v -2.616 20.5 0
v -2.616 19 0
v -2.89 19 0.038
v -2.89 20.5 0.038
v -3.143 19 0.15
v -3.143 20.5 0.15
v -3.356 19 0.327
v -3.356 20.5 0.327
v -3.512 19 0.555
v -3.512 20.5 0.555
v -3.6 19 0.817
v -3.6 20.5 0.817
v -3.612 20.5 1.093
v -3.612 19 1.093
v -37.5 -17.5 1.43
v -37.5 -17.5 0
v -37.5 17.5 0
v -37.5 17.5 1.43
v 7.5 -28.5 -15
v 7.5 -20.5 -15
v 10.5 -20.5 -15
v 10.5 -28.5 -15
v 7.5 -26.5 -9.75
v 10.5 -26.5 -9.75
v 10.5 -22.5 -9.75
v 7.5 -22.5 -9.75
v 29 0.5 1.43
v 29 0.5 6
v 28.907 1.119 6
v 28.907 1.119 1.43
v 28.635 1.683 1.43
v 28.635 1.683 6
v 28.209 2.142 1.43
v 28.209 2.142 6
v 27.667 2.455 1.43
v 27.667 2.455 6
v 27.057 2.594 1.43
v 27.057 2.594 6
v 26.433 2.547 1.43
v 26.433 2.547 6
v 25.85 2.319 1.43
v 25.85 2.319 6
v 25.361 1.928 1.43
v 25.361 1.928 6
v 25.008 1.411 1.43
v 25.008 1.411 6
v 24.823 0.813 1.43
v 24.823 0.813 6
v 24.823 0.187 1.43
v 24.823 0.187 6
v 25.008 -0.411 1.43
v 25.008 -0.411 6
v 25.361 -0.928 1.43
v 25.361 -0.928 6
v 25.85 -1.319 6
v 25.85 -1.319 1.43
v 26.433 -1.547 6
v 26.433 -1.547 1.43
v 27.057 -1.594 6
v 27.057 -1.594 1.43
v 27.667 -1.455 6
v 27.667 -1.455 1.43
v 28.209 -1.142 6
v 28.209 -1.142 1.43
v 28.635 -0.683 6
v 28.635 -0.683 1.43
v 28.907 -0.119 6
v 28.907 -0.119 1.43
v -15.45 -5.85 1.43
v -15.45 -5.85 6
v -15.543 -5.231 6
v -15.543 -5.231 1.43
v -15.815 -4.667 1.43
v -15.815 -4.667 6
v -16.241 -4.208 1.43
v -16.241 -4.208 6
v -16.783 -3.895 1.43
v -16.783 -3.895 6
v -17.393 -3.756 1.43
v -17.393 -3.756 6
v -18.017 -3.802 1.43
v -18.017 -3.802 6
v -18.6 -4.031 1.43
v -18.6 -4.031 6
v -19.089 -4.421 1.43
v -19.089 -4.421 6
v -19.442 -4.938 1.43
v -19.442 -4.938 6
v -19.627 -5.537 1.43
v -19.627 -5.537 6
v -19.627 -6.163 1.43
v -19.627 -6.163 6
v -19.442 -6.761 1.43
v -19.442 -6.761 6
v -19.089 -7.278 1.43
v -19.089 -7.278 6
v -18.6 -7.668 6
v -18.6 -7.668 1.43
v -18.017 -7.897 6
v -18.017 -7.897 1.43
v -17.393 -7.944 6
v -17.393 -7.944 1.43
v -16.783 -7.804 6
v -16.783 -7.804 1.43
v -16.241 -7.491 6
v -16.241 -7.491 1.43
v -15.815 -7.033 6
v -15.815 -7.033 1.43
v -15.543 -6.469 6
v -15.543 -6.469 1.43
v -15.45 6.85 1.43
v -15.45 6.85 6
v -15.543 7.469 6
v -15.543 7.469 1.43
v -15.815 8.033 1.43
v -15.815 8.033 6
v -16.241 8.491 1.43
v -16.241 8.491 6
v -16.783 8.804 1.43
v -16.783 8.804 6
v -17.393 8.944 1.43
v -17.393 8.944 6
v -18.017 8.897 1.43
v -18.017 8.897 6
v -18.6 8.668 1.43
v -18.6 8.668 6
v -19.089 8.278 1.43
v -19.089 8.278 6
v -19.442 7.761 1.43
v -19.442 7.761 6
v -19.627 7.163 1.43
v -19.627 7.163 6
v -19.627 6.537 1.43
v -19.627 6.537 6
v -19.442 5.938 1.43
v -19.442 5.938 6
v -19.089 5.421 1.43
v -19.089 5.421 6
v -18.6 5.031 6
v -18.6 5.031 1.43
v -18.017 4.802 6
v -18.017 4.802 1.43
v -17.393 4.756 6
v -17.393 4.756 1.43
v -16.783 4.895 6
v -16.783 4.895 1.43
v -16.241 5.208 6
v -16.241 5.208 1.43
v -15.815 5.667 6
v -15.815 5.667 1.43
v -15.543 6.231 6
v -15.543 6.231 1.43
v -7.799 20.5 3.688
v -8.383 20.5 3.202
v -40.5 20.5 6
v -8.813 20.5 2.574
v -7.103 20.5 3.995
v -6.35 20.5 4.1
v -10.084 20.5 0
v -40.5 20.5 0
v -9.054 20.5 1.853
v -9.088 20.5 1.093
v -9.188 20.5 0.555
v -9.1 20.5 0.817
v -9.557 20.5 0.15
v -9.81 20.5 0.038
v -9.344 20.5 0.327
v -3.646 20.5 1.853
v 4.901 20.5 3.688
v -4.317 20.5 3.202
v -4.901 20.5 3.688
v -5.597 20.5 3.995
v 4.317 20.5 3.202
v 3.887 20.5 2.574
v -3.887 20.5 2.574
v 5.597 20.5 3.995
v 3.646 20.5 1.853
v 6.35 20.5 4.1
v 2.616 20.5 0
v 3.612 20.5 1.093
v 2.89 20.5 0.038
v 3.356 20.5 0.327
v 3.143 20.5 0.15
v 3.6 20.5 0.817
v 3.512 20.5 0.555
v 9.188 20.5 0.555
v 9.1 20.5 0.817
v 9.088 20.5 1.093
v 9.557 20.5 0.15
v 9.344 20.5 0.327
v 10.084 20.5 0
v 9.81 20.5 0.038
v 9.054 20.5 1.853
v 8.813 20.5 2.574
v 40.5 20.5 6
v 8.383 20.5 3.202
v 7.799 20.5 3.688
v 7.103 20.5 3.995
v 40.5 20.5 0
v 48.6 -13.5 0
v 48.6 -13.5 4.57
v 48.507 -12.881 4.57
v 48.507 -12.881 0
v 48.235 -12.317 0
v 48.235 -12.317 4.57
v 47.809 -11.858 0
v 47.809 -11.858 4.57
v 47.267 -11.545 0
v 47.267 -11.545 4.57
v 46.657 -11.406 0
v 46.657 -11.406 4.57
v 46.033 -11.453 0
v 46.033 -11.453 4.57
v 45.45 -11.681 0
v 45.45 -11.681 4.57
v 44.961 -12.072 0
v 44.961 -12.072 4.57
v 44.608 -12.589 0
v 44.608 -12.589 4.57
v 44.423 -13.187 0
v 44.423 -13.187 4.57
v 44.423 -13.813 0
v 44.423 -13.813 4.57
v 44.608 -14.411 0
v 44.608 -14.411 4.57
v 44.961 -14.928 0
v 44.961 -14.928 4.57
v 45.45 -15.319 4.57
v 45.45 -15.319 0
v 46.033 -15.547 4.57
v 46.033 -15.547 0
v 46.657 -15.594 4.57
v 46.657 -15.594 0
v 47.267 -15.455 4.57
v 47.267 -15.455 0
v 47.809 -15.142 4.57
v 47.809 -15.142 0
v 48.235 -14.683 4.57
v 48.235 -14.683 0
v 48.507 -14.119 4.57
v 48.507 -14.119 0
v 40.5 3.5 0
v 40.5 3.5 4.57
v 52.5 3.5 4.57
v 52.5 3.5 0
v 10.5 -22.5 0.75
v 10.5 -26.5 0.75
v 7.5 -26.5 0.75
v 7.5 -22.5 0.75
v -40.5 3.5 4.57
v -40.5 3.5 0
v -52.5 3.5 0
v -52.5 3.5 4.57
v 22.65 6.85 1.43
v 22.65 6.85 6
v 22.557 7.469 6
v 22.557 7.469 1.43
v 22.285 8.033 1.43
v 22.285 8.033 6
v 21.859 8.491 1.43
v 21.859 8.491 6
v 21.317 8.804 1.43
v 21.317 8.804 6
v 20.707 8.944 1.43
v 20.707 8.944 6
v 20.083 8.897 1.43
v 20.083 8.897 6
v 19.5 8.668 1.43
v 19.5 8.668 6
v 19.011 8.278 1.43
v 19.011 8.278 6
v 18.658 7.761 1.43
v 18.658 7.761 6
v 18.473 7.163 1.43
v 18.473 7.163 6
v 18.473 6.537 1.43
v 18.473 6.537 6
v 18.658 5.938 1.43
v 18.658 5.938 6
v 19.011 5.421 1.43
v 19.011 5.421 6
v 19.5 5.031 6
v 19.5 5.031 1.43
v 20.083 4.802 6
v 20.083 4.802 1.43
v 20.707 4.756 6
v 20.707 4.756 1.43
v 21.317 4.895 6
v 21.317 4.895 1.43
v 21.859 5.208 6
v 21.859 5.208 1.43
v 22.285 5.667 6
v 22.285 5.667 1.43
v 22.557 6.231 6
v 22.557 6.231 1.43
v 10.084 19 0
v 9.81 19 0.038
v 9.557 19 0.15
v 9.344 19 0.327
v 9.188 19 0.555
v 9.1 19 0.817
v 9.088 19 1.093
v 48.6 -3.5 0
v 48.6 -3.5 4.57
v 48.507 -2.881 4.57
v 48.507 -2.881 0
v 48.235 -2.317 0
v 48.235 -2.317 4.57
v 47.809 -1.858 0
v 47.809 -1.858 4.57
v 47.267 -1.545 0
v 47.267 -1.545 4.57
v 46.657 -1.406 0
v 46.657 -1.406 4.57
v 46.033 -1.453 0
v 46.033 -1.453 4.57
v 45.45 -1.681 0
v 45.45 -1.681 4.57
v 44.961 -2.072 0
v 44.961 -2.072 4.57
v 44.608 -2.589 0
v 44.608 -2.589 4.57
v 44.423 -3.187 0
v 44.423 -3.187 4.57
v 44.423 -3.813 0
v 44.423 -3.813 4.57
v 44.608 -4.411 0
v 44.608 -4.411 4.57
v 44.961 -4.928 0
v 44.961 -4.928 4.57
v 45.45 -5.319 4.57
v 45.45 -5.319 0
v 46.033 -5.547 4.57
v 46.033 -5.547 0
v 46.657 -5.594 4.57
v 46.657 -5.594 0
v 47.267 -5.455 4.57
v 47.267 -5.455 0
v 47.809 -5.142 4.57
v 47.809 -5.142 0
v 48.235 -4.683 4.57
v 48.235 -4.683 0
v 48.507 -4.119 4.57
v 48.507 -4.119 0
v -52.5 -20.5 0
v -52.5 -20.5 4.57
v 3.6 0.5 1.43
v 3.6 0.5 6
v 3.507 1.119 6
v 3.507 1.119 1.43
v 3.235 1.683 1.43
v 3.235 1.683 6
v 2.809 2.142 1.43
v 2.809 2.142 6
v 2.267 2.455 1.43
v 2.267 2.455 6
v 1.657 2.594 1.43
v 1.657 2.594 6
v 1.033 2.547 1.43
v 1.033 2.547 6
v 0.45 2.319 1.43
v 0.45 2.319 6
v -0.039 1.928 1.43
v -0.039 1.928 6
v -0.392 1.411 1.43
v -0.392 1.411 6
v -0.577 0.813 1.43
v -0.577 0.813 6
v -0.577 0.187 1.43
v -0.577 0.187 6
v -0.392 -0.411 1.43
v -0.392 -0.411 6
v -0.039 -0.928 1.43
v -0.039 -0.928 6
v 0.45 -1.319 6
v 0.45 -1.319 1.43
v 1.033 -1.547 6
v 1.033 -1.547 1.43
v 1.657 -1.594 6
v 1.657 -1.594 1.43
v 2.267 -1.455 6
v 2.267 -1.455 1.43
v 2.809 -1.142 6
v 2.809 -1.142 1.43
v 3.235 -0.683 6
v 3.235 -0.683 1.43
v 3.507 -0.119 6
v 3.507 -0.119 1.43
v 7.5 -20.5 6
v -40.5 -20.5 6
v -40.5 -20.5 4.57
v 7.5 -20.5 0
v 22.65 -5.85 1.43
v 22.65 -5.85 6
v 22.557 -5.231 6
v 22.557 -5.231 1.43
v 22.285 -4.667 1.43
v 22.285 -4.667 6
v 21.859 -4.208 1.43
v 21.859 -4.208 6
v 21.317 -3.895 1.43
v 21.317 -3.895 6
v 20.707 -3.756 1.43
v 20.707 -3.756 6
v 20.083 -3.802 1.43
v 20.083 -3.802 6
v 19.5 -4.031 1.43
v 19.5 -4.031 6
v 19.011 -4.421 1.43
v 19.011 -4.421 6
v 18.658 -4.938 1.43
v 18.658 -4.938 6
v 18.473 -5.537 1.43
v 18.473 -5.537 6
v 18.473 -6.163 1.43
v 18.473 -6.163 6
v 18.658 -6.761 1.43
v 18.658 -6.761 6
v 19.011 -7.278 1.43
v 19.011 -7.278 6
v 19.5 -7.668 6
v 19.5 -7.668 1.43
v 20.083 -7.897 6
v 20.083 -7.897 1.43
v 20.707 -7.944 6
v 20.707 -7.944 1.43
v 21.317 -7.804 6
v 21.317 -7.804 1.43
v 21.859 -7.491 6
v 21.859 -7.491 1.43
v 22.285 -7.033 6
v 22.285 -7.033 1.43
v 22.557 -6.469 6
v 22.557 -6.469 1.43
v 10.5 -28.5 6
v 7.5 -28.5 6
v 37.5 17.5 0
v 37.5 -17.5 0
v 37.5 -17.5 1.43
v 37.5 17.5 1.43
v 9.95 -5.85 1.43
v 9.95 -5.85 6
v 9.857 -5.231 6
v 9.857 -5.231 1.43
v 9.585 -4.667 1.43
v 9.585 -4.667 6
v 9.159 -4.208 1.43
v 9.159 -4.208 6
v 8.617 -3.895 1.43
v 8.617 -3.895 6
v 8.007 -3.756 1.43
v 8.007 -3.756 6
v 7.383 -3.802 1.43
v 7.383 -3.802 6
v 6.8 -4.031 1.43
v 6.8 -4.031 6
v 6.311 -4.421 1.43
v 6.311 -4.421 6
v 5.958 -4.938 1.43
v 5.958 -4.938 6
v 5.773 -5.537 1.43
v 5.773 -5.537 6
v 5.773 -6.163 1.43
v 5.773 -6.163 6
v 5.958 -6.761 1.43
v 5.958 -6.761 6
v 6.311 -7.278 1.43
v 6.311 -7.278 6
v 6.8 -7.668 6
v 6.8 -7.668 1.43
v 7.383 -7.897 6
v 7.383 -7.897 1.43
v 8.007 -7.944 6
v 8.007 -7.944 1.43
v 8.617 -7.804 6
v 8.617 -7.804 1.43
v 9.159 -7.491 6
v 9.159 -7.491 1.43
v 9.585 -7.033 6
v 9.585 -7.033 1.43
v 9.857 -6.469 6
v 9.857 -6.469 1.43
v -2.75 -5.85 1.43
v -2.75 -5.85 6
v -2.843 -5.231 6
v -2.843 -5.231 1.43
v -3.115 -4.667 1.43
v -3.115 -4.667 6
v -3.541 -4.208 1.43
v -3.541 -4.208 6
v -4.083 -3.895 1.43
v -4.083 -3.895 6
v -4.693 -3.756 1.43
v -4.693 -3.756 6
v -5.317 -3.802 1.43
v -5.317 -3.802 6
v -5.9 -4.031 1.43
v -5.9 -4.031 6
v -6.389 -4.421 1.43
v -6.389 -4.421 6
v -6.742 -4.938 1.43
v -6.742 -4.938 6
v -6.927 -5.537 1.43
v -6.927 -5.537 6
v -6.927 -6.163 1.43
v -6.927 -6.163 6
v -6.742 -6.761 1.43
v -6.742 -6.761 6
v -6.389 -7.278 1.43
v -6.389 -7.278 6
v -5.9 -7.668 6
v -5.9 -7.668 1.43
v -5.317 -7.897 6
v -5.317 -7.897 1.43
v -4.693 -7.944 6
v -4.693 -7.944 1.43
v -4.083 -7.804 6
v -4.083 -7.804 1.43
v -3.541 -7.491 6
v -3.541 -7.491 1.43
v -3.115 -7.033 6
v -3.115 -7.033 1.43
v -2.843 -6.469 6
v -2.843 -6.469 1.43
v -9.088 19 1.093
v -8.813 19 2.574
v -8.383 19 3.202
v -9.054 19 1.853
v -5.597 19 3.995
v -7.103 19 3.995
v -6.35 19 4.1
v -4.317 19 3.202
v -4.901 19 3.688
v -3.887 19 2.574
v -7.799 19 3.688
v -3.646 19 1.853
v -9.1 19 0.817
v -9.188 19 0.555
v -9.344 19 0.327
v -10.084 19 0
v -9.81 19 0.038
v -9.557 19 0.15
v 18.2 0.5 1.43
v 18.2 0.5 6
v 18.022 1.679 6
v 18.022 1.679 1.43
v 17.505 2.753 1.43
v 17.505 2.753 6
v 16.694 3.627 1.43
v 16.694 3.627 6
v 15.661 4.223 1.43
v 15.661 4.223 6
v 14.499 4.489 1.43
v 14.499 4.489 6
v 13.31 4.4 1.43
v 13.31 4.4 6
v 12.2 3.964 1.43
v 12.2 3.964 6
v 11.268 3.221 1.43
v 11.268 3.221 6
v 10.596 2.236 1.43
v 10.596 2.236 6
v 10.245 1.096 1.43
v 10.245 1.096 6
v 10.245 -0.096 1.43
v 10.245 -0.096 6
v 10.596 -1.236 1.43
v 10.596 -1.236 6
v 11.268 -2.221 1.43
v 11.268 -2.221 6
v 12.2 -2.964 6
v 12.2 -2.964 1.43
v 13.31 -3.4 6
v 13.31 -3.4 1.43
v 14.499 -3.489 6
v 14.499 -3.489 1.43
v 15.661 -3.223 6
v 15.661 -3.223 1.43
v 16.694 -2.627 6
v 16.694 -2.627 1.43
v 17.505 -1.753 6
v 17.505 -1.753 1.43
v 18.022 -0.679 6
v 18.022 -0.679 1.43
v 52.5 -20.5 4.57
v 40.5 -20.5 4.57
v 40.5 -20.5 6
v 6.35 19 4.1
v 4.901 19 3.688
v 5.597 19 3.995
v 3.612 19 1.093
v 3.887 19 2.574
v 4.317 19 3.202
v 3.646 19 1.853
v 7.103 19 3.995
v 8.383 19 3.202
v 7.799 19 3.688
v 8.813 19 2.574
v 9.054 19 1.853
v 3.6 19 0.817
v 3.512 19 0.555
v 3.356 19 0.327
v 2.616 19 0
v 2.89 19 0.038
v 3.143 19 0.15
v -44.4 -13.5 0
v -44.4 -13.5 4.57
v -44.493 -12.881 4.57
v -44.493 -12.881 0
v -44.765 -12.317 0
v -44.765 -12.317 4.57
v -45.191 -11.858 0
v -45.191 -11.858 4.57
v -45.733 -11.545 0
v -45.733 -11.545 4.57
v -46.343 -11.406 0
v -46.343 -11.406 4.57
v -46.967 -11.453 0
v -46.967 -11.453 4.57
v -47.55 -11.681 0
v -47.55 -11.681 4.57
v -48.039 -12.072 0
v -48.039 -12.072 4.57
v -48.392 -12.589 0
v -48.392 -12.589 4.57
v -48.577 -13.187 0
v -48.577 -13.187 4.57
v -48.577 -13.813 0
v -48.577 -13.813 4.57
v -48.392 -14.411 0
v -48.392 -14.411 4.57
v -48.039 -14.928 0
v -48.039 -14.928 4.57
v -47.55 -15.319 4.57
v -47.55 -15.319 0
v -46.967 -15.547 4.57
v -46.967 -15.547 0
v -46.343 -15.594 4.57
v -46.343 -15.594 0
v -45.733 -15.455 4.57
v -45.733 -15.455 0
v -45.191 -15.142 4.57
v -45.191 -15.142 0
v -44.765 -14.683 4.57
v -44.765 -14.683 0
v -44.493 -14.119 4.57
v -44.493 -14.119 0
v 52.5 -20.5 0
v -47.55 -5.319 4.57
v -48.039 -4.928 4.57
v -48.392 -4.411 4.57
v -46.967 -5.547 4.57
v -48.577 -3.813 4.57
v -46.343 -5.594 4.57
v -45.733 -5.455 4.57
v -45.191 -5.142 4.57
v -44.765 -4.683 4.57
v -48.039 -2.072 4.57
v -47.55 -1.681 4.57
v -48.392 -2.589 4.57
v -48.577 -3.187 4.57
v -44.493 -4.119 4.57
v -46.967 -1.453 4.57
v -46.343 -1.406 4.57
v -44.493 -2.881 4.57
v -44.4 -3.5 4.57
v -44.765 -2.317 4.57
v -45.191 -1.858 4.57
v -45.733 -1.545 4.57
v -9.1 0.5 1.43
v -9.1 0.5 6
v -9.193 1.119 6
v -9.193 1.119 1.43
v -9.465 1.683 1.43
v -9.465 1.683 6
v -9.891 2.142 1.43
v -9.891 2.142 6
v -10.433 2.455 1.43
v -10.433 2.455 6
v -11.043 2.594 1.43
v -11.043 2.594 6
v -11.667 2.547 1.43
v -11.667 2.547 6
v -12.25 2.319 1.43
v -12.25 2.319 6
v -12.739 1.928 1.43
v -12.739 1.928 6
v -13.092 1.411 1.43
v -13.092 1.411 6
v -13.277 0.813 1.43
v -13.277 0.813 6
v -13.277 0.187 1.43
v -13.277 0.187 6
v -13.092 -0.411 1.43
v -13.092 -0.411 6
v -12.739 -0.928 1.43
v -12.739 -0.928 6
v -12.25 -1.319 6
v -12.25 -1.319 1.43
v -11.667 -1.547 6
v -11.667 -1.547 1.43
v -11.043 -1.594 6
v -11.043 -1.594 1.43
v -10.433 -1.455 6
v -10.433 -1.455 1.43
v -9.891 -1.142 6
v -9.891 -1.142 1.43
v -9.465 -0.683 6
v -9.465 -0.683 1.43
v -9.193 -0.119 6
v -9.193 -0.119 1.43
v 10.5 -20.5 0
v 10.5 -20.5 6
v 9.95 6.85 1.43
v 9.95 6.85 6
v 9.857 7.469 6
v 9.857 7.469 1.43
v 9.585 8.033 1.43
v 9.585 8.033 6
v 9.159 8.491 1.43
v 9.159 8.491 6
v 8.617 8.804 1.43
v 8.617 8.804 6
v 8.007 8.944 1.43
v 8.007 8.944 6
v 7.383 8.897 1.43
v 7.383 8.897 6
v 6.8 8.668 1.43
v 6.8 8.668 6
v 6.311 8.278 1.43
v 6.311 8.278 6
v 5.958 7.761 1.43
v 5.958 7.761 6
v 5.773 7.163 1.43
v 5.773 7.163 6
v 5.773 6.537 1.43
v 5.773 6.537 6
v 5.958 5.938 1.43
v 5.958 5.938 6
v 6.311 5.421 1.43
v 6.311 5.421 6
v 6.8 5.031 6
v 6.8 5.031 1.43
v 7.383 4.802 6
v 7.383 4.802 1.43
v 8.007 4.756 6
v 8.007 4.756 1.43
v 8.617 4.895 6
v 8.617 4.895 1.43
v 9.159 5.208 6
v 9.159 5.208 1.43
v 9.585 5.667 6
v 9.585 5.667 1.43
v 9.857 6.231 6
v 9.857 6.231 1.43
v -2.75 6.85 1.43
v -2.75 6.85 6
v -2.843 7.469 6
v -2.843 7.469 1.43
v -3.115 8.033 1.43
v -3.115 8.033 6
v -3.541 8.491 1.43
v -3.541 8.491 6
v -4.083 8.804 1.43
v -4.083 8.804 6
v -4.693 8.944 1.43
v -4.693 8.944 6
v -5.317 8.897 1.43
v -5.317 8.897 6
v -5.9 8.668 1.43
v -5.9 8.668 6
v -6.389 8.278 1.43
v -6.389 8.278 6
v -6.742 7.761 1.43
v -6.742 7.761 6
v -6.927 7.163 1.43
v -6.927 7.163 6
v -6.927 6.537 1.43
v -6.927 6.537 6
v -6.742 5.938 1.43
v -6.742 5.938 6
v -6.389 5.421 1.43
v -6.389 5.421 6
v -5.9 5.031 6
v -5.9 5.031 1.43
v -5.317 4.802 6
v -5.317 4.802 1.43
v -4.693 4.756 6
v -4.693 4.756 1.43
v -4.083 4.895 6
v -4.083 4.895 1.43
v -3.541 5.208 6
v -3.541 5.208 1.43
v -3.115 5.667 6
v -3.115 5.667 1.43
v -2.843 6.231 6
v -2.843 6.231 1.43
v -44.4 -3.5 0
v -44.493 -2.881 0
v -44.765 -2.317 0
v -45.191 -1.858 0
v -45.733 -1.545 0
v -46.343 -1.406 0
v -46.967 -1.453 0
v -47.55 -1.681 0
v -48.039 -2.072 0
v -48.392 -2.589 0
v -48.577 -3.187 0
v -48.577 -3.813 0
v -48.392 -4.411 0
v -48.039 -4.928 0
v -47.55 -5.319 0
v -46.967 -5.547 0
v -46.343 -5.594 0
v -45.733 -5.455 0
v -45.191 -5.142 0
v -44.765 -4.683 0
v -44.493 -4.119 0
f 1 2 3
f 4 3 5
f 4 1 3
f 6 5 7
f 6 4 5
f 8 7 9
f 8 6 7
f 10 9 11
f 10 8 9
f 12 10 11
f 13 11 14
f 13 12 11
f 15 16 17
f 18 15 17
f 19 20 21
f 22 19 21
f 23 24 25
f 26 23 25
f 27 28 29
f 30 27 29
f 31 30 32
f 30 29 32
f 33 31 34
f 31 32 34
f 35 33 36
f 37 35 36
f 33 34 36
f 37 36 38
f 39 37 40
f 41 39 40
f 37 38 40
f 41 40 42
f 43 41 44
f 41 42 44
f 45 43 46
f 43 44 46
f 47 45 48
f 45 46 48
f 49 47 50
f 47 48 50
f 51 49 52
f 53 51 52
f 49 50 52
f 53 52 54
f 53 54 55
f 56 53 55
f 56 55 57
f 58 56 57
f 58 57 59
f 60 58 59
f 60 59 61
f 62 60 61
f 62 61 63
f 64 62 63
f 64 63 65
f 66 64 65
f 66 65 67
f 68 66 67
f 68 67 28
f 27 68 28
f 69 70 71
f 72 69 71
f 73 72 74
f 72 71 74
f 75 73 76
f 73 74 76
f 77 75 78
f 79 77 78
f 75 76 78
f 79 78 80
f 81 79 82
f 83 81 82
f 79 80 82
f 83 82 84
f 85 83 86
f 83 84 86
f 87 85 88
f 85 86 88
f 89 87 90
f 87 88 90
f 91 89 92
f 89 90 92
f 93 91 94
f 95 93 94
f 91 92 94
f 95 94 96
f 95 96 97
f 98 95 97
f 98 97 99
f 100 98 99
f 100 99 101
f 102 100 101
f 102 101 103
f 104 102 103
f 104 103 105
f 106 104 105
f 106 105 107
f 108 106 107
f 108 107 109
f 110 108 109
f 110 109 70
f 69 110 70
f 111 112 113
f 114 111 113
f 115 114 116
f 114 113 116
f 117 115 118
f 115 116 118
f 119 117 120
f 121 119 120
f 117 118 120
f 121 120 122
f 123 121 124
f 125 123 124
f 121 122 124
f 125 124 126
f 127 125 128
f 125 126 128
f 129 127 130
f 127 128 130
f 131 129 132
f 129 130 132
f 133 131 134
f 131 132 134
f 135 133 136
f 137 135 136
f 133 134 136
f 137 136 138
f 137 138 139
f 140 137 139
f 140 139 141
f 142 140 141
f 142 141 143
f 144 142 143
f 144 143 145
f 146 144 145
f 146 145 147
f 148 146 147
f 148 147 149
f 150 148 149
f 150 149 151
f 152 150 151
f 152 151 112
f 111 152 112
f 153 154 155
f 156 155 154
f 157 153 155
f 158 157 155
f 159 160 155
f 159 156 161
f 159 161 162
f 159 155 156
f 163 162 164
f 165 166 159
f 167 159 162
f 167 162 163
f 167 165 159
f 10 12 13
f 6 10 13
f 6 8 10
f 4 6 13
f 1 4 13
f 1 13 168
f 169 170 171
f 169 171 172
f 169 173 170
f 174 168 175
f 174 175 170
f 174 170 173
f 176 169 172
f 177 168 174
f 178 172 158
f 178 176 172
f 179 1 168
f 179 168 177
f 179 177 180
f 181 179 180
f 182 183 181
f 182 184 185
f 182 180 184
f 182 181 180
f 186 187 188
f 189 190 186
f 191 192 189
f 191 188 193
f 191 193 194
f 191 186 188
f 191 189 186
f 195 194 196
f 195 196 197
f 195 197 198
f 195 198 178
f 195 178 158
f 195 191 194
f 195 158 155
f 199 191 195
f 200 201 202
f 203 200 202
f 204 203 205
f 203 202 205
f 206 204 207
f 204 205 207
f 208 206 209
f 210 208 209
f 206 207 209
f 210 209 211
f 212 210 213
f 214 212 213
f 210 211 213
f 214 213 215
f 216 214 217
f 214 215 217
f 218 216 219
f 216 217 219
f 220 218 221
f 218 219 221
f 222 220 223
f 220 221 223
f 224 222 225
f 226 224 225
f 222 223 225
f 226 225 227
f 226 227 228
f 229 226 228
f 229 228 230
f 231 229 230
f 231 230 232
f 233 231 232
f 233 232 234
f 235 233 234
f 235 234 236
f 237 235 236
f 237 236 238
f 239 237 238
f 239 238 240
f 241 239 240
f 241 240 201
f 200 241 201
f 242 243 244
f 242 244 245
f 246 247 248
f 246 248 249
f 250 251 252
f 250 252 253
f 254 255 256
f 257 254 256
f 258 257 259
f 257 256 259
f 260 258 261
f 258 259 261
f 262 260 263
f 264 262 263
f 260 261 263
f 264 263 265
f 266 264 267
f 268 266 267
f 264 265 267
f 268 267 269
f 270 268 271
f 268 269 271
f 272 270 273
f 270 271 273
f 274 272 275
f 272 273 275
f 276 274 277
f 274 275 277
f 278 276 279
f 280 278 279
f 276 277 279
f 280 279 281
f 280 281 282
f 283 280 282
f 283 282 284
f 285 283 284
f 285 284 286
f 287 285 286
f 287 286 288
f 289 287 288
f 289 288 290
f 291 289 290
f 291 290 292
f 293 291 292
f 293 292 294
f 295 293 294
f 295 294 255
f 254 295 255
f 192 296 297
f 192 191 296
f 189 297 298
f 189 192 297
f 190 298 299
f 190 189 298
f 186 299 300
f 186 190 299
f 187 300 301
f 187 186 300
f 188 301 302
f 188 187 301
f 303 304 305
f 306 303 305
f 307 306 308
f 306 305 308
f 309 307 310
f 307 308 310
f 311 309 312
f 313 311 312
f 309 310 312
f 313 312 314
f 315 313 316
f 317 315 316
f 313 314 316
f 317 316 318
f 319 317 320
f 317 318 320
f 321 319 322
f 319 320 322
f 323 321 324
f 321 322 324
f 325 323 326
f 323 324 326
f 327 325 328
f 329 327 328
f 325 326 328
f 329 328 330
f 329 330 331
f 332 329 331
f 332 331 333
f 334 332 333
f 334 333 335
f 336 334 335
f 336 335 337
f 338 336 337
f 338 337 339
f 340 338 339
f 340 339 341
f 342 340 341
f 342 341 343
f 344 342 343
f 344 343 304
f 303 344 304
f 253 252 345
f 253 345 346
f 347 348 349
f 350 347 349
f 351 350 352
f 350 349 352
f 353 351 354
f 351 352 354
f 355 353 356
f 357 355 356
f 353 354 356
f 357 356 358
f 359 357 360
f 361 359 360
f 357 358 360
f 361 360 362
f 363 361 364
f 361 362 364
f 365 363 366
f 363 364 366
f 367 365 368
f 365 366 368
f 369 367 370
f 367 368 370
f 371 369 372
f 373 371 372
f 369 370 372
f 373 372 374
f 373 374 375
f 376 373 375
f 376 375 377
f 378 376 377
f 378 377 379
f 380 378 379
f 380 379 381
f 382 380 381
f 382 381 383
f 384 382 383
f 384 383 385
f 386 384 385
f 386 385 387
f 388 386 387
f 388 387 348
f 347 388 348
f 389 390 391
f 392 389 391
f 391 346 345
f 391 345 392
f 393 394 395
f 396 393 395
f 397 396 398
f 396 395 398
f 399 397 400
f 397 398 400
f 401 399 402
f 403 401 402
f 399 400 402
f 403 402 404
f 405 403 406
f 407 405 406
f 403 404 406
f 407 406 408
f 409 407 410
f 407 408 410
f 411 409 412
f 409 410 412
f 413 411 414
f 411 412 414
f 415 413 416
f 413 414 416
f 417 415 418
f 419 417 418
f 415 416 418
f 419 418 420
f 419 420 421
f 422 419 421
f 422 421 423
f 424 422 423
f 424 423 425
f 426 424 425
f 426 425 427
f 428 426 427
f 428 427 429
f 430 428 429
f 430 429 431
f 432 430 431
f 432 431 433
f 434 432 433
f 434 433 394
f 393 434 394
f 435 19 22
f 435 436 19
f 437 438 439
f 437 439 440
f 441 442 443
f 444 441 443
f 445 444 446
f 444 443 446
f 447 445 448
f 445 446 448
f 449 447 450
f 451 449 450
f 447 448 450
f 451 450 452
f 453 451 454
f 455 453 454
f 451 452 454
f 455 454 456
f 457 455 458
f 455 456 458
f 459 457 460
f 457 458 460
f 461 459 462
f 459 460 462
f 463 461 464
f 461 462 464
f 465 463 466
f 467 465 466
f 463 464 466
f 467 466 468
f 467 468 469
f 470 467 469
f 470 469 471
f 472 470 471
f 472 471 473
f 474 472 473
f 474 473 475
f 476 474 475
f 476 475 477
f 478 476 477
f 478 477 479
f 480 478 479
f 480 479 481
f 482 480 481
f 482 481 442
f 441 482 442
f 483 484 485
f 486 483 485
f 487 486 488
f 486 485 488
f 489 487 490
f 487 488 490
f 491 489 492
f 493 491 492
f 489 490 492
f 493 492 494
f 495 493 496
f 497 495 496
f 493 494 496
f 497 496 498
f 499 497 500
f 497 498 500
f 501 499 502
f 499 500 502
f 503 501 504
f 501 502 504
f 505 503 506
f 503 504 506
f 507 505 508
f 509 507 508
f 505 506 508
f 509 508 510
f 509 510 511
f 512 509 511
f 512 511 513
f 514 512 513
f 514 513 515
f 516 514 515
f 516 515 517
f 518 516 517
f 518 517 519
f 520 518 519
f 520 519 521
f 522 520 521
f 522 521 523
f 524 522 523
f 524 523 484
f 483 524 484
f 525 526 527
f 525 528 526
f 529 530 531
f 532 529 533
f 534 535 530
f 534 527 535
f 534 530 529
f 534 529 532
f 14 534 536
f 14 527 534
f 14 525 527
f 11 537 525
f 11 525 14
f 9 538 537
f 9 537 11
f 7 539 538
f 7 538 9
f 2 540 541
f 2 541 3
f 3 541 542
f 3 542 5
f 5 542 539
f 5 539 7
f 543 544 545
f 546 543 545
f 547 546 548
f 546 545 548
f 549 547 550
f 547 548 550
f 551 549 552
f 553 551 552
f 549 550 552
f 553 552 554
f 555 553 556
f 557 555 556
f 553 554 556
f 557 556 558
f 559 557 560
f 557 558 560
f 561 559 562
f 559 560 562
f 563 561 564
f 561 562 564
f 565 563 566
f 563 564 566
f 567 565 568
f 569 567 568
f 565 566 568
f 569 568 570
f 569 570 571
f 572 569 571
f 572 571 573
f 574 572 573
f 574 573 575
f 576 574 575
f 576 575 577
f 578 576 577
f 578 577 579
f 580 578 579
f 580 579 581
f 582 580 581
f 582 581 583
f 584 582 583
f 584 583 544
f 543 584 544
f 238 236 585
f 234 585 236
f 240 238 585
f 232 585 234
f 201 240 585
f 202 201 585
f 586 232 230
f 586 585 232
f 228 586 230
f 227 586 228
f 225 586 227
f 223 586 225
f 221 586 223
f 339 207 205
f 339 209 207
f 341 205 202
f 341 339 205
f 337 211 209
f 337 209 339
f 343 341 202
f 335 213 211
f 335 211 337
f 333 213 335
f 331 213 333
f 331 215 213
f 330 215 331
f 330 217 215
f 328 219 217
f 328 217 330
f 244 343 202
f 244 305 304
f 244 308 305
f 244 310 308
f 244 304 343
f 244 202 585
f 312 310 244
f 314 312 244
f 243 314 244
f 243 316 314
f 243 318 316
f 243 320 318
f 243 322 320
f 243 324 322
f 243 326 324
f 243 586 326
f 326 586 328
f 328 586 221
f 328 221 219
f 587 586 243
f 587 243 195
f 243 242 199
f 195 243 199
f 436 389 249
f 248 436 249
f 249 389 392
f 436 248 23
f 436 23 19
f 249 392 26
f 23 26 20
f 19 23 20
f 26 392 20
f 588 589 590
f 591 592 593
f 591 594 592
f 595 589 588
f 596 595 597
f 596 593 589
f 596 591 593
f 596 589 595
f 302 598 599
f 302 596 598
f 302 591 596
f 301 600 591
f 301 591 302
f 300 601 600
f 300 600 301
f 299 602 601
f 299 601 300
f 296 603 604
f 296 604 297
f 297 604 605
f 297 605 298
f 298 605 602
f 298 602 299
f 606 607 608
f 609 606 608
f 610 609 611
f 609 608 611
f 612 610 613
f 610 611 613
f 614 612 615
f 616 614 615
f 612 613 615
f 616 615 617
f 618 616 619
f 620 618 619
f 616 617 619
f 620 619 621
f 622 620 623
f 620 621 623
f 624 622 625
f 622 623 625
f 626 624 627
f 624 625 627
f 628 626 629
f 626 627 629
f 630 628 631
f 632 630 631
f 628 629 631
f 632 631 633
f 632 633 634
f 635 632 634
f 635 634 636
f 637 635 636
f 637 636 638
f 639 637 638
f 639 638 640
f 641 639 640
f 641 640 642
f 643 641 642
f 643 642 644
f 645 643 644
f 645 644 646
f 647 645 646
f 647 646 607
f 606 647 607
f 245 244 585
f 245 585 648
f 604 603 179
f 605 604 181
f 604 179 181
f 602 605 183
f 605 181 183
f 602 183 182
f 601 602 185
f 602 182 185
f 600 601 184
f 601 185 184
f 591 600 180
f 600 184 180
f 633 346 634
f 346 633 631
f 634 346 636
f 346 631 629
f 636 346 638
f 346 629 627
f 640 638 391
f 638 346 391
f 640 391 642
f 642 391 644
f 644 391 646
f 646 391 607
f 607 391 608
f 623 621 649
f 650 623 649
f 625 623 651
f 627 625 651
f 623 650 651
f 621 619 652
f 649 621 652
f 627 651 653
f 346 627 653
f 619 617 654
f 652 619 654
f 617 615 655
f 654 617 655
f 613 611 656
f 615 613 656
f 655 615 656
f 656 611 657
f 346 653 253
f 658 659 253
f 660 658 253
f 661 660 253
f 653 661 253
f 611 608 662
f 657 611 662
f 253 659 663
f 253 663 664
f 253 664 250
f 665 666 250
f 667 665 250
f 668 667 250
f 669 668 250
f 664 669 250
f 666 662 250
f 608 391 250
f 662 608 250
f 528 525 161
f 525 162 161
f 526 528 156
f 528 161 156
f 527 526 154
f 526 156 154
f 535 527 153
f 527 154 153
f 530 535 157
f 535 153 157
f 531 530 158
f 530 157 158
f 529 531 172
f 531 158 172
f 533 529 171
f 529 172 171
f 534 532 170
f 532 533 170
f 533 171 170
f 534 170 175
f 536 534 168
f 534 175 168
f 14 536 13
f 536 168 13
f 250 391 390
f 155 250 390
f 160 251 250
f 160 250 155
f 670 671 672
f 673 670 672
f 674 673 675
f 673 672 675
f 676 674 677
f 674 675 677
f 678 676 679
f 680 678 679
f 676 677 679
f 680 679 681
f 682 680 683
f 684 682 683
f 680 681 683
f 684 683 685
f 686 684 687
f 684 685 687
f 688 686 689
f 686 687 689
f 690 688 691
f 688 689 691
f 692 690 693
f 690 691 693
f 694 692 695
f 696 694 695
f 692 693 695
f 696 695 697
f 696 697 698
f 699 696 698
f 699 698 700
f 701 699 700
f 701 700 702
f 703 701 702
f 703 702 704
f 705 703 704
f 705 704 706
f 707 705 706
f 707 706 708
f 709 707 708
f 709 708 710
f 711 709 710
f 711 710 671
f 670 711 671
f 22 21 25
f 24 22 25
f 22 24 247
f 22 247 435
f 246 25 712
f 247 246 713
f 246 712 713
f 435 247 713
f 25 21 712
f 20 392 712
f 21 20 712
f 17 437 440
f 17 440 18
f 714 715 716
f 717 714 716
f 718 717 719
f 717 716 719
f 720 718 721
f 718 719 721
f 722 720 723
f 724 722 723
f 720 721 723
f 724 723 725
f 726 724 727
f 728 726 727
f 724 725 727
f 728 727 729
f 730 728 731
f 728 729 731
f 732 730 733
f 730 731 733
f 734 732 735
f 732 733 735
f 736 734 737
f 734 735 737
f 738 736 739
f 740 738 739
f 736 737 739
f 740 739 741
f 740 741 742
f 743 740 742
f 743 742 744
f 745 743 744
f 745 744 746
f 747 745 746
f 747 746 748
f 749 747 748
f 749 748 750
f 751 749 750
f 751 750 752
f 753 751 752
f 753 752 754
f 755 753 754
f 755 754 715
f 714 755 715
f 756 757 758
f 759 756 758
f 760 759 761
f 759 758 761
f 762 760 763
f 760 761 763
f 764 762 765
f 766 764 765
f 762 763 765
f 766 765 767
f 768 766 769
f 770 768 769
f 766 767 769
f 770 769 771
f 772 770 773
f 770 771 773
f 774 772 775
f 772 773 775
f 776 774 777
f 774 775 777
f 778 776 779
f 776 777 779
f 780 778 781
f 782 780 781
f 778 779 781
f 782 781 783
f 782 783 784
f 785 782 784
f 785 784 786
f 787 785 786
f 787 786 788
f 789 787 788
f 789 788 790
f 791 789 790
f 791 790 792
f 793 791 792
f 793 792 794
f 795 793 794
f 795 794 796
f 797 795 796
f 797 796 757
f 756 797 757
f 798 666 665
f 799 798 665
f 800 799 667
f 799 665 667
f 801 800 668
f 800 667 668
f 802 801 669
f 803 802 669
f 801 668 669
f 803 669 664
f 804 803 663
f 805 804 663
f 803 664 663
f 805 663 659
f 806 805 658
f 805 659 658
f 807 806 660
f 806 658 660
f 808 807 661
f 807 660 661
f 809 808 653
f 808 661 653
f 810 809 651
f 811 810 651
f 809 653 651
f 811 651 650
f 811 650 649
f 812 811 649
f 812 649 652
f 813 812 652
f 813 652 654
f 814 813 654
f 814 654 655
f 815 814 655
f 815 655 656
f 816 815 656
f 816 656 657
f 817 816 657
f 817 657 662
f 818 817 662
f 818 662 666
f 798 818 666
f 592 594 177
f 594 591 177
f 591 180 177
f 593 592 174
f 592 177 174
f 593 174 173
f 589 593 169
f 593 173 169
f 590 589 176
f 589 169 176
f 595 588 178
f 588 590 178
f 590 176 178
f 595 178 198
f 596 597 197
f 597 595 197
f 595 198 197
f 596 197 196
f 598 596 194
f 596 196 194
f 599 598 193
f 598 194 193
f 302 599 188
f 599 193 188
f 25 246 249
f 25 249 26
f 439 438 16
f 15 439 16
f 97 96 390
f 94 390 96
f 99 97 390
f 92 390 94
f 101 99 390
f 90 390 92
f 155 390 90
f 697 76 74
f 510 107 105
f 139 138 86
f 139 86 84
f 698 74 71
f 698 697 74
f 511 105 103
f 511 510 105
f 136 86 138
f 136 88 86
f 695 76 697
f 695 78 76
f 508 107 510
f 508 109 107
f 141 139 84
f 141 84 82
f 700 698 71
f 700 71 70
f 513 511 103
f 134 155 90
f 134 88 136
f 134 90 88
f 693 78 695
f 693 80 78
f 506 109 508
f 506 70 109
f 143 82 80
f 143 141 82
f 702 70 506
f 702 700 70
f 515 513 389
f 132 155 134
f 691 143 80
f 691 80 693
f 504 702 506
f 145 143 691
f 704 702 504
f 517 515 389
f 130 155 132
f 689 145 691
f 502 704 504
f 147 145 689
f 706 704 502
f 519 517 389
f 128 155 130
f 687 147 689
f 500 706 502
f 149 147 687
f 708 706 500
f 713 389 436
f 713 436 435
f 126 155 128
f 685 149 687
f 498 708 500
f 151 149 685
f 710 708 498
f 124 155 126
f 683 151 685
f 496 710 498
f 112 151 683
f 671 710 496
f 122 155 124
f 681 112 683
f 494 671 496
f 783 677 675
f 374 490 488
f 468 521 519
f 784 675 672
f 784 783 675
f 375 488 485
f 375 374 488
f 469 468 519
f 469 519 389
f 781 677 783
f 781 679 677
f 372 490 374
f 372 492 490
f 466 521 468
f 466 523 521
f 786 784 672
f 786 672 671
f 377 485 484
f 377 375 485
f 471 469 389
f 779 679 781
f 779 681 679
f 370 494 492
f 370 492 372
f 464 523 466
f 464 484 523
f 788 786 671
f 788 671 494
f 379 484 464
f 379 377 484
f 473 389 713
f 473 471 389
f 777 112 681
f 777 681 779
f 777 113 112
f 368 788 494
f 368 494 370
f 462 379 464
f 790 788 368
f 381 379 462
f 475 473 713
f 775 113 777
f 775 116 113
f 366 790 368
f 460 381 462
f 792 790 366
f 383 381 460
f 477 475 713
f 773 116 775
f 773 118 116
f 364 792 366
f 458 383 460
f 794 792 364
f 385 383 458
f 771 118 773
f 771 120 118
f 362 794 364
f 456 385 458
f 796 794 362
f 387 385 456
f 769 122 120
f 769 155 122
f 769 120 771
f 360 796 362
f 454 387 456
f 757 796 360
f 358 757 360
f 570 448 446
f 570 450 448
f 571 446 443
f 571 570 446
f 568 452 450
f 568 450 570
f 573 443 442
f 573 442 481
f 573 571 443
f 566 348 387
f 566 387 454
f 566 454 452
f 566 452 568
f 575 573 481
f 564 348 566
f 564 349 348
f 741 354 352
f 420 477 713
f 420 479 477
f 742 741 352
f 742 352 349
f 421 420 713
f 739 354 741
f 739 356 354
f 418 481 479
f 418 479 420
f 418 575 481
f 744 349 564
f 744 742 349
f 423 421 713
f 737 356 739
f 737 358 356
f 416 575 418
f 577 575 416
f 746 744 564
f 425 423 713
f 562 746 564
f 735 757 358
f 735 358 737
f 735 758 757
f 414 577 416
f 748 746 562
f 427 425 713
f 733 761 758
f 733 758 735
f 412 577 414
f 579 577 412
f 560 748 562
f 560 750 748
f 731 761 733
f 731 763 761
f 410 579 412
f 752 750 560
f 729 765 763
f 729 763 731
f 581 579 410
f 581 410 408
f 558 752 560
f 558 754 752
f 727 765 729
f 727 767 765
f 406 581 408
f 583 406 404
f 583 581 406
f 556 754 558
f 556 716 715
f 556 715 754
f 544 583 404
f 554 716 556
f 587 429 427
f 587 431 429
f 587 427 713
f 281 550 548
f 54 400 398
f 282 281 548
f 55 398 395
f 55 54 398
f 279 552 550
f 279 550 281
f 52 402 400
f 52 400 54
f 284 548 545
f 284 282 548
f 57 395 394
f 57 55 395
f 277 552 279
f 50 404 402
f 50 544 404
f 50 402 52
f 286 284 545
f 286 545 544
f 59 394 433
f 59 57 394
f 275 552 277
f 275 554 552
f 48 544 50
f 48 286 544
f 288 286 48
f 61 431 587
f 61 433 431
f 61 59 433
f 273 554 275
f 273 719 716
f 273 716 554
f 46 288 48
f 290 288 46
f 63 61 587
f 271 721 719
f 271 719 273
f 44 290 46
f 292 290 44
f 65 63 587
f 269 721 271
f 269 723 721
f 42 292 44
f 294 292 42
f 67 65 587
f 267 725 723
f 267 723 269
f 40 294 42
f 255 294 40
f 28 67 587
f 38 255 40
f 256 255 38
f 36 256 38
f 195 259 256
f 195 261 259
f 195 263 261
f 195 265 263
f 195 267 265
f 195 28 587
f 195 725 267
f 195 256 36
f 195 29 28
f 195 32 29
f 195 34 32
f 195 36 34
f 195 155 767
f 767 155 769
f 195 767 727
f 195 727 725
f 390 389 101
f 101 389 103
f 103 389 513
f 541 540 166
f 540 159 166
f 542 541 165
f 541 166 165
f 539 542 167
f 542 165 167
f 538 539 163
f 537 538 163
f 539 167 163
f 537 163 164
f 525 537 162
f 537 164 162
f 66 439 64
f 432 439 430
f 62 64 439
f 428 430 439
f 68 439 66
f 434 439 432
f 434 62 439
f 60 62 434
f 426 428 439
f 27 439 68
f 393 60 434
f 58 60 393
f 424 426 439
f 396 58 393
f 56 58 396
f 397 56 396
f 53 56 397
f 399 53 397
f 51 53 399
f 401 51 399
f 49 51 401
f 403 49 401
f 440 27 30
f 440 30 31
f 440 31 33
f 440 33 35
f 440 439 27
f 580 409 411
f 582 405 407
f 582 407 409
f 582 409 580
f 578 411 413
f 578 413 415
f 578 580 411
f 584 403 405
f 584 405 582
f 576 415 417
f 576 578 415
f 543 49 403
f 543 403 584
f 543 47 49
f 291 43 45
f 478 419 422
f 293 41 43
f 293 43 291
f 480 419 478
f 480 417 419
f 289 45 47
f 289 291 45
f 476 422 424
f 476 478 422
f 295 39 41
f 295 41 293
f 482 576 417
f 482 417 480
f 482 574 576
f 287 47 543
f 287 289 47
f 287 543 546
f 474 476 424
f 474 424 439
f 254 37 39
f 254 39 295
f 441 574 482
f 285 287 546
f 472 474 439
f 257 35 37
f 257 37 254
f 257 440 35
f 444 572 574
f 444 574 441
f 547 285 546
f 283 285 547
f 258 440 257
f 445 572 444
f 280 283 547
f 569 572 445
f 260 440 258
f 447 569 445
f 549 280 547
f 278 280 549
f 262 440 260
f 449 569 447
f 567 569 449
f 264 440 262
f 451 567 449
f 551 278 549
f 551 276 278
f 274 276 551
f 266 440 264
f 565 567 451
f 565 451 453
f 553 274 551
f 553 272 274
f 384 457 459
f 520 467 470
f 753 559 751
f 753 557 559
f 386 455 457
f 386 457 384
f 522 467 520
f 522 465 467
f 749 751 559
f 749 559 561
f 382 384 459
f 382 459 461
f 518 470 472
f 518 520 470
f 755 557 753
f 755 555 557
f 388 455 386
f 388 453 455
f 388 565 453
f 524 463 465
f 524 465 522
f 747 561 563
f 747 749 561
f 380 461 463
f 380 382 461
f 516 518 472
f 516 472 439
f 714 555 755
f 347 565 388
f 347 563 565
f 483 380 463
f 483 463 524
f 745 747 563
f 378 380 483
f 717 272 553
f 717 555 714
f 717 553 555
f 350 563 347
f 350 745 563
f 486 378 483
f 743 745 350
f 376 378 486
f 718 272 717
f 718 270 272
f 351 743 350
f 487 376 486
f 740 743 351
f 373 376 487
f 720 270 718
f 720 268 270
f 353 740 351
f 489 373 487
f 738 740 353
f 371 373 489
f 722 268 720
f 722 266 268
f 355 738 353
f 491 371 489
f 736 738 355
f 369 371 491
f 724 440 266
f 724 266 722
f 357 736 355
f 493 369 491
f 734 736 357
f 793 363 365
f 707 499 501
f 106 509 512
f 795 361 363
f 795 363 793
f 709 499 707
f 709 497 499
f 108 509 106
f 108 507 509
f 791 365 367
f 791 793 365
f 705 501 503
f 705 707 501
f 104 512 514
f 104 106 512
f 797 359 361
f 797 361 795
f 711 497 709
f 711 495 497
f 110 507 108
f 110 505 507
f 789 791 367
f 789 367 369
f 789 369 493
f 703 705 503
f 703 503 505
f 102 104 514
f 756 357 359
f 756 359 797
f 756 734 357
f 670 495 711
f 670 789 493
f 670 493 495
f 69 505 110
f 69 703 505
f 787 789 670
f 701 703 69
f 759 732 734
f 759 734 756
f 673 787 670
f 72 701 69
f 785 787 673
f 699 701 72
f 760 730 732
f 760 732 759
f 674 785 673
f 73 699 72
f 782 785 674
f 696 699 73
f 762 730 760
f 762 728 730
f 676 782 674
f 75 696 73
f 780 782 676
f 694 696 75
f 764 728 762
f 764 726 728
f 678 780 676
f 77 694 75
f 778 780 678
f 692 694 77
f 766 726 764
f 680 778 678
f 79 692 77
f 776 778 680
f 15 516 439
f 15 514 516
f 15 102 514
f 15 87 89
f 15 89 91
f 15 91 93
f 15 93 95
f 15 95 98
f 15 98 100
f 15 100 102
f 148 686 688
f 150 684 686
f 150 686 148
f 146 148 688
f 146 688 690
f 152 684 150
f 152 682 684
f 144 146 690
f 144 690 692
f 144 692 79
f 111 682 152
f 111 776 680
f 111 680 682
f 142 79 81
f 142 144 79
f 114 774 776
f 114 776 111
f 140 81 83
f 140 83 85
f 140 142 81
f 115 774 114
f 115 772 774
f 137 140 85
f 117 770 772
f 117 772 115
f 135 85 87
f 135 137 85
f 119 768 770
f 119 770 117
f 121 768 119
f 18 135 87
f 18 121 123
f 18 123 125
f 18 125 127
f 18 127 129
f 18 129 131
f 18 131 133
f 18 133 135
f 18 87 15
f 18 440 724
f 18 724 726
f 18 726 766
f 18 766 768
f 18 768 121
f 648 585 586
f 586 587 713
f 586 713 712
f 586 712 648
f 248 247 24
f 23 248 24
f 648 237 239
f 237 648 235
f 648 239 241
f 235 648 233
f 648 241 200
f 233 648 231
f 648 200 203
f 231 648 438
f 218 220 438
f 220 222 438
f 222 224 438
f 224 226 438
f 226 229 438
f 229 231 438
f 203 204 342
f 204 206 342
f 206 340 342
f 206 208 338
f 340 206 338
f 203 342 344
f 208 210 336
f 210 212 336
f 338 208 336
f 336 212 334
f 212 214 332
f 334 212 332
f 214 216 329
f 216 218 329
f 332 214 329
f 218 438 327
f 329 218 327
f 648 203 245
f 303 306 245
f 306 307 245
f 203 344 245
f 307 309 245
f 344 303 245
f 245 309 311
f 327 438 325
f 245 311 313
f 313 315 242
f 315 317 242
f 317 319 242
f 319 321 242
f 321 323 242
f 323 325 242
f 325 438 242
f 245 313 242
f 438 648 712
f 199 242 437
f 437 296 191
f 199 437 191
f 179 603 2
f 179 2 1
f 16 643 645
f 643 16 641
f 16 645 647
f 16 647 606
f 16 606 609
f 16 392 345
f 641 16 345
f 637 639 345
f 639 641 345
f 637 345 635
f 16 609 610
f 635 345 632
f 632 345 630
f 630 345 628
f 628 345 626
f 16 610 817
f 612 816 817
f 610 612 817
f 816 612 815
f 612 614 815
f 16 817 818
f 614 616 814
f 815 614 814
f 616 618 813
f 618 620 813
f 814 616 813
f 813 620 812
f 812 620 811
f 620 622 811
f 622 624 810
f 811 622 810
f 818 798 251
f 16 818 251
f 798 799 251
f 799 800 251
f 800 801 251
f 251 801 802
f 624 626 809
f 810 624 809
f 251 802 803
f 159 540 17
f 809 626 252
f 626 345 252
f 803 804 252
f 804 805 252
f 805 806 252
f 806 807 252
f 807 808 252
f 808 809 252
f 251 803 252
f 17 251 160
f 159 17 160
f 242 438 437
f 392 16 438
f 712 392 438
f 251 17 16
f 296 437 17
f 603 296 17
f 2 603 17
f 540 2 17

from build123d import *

# Parameters (mm, degrees)
SKETCH1_W           = 81
SKETCH1_H           = 41
BOSS_EXTRUDE1_DEPTH = 6
SKETCH5_W           = 75
SKETCH5_H           = 35
CUT_EXTRUDE1_DEPTH  = 1.43
SKETCH8_R           = 2.1
SKETCH8_R_2         = 4
CUT_EXTRUDE2_DEPTH  = 46.787552894
SKETCH9_R           = 2.75
CUT_EXTRUDE3_DEPTH  = 1.5
FILLET1_R           = 1
SKETCH10_W          = 4.57
SKETCH10_H          = 24
BOSS_EXTRUDE2_DEPTH = 12
SKETCH12_W          = 4.57
SKETCH12_H          = 24
BOSS_EXTRUDE3_DEPTH = 12
SKETCH13_R          = 2.1
CUT_EXTRUDE4_DEPTH  = 57.545423334
SKETCH14_W          = 3
SKETCH14_H          = 15
SKETCH14_H_2        = 6
BOSS_EXTRUDE4_DEPTH = 8
SKETCH15_W          = 10.5
SKETCH15_H          = 4
CUT_EXTRUDE5_DEPTH  = 71.75485849


with BuildPart() as part:
    # Sketch1 → Boss-Extrude1 (new body)
    with BuildSketch(Plane.XY):
        Rectangle(SKETCH1_W, SKETCH1_H)
    extrude(amount=BOSS_EXTRUDE1_DEPTH)

    # Sketch5 → Cut-Extrude1 (cut)
    with BuildSketch(Plane(origin=(0, 0, 0), x_dir=(-1, 0, 0), z_dir=(0, 0, -1))):
        Rectangle(SKETCH5_W, SKETCH5_H)
    extrude(amount=-CUT_EXTRUDE1_DEPTH, mode=Mode.SUBTRACT)

    # Sketch8 → Cut-Extrude2 (cut, through all)
    with BuildSketch(Plane.XY.offset(6)):
        with Locations((26.9, 0.5)):
            Circle(SKETCH8_R)
        with Locations((20.55, 6.849637785)):
            Circle(SKETCH8_R)
        with Locations((7.85, 6.849637785)):
            Circle(SKETCH8_R)
        with Locations((7.85, -5.849637785)):
            Circle(SKETCH8_R)
        with Locations((20.55, -5.849637785)):
            Circle(SKETCH8_R)
        with Locations((1.5, 0.5)):
            Circle(SKETCH8_R)
        with Locations((-4.85, 6.849637785)):
            Circle(SKETCH8_R)
        with Locations((-4.85, -5.849637785)):
            Circle(SKETCH8_R)
        with Locations((-11.2, 0.5)):
            Circle(SKETCH8_R)
        with Locations((-17.55, 6.849637785)):
            Circle(SKETCH8_R)
        with Locations((-17.55, -5.849637785)):
            Circle(SKETCH8_R)
        with Locations((14.2, 0.5)):
            Circle(SKETCH8_R_2)
    extrude(amount=-CUT_EXTRUDE2_DEPTH, mode=Mode.SUBTRACT)

    # Sketch9 → Cut-Extrude3 (cut)
    with BuildSketch(Plane(origin=(0, 20.5, 0), x_dir=(1, 0, 0), z_dir=(0, 1, 0))):
        with Locations((6.35, -1.35)):
            Circle(SKETCH9_R)
        with Locations((-6.35, -1.35)):
            Circle(SKETCH9_R)
    extrude(amount=-CUT_EXTRUDE3_DEPTH, mode=Mode.SUBTRACT)

    # Fillet1
    fillet1_edges = [part.edges().sort_by_distance(p)[0] for p in [
        (-8.74582971, 19.75, 0),
        (-3.95417029, 19.75, 0),
        (3.95417029, 19.75, 0),
        (8.74582971, 19.75, 0),
    ]]
    fillet(fillet1_edges, radius=FILLET1_R)

    # Sketch10 → Boss-Extrude2 (add)
    with BuildSketch(Plane.ZY.offset(40.5)):
        with Locations((2.285, -8.5)):
            Rectangle(SKETCH10_W, SKETCH10_H)
    extrude(amount=BOSS_EXTRUDE2_DEPTH)

    # Sketch12 → Boss-Extrude3 (add)
    with BuildSketch(Plane(origin=(40.5, 0, 0), x_dir=(0, 0, -1), z_dir=(1, 0, 0))):
        with Locations((-2.285, -8.5)):
            Rectangle(SKETCH12_W, SKETCH12_H)
    extrude(amount=BOSS_EXTRUDE3_DEPTH)

    # Sketch13 → Cut-Extrude4 (cut, through all)
    with BuildSketch(Plane.XY.offset(4.57)):
        with Locations((-46.5, -3.5)):
            Circle(SKETCH13_R)
        with Locations((-46.5, -13.5)):
            Circle(SKETCH13_R)
        with Locations((46.5, -3.5)):
            Circle(SKETCH13_R)
        with Locations((46.5, -13.5)):
            Circle(SKETCH13_R)
    extrude(amount=-CUT_EXTRUDE4_DEPTH, mode=Mode.SUBTRACT)

    # Sketch14 → Boss-Extrude4 (add)
    with BuildSketch(Plane.XZ.offset(20.5)):
        with Locations((9, -7.5)):
            Rectangle(SKETCH14_W, SKETCH14_H)
        with Locations((9, 3)):
            Rectangle(SKETCH14_W, SKETCH14_H_2)
    extrude(amount=BOSS_EXTRUDE4_DEPTH)

    # Sketch15 → Cut-Extrude5 (cut, through all)
    with BuildSketch(Plane(origin=(10.5, 0, 0), x_dir=(0, 0, -1), z_dir=(1, 0, 0))):
        with Locations((4.5, -24.5)):
            Rectangle(SKETCH15_W, SKETCH15_H)
    extrude(amount=-CUT_EXTRUDE5_DEPTH, mode=Mode.SUBTRACT)


solid = part.part
